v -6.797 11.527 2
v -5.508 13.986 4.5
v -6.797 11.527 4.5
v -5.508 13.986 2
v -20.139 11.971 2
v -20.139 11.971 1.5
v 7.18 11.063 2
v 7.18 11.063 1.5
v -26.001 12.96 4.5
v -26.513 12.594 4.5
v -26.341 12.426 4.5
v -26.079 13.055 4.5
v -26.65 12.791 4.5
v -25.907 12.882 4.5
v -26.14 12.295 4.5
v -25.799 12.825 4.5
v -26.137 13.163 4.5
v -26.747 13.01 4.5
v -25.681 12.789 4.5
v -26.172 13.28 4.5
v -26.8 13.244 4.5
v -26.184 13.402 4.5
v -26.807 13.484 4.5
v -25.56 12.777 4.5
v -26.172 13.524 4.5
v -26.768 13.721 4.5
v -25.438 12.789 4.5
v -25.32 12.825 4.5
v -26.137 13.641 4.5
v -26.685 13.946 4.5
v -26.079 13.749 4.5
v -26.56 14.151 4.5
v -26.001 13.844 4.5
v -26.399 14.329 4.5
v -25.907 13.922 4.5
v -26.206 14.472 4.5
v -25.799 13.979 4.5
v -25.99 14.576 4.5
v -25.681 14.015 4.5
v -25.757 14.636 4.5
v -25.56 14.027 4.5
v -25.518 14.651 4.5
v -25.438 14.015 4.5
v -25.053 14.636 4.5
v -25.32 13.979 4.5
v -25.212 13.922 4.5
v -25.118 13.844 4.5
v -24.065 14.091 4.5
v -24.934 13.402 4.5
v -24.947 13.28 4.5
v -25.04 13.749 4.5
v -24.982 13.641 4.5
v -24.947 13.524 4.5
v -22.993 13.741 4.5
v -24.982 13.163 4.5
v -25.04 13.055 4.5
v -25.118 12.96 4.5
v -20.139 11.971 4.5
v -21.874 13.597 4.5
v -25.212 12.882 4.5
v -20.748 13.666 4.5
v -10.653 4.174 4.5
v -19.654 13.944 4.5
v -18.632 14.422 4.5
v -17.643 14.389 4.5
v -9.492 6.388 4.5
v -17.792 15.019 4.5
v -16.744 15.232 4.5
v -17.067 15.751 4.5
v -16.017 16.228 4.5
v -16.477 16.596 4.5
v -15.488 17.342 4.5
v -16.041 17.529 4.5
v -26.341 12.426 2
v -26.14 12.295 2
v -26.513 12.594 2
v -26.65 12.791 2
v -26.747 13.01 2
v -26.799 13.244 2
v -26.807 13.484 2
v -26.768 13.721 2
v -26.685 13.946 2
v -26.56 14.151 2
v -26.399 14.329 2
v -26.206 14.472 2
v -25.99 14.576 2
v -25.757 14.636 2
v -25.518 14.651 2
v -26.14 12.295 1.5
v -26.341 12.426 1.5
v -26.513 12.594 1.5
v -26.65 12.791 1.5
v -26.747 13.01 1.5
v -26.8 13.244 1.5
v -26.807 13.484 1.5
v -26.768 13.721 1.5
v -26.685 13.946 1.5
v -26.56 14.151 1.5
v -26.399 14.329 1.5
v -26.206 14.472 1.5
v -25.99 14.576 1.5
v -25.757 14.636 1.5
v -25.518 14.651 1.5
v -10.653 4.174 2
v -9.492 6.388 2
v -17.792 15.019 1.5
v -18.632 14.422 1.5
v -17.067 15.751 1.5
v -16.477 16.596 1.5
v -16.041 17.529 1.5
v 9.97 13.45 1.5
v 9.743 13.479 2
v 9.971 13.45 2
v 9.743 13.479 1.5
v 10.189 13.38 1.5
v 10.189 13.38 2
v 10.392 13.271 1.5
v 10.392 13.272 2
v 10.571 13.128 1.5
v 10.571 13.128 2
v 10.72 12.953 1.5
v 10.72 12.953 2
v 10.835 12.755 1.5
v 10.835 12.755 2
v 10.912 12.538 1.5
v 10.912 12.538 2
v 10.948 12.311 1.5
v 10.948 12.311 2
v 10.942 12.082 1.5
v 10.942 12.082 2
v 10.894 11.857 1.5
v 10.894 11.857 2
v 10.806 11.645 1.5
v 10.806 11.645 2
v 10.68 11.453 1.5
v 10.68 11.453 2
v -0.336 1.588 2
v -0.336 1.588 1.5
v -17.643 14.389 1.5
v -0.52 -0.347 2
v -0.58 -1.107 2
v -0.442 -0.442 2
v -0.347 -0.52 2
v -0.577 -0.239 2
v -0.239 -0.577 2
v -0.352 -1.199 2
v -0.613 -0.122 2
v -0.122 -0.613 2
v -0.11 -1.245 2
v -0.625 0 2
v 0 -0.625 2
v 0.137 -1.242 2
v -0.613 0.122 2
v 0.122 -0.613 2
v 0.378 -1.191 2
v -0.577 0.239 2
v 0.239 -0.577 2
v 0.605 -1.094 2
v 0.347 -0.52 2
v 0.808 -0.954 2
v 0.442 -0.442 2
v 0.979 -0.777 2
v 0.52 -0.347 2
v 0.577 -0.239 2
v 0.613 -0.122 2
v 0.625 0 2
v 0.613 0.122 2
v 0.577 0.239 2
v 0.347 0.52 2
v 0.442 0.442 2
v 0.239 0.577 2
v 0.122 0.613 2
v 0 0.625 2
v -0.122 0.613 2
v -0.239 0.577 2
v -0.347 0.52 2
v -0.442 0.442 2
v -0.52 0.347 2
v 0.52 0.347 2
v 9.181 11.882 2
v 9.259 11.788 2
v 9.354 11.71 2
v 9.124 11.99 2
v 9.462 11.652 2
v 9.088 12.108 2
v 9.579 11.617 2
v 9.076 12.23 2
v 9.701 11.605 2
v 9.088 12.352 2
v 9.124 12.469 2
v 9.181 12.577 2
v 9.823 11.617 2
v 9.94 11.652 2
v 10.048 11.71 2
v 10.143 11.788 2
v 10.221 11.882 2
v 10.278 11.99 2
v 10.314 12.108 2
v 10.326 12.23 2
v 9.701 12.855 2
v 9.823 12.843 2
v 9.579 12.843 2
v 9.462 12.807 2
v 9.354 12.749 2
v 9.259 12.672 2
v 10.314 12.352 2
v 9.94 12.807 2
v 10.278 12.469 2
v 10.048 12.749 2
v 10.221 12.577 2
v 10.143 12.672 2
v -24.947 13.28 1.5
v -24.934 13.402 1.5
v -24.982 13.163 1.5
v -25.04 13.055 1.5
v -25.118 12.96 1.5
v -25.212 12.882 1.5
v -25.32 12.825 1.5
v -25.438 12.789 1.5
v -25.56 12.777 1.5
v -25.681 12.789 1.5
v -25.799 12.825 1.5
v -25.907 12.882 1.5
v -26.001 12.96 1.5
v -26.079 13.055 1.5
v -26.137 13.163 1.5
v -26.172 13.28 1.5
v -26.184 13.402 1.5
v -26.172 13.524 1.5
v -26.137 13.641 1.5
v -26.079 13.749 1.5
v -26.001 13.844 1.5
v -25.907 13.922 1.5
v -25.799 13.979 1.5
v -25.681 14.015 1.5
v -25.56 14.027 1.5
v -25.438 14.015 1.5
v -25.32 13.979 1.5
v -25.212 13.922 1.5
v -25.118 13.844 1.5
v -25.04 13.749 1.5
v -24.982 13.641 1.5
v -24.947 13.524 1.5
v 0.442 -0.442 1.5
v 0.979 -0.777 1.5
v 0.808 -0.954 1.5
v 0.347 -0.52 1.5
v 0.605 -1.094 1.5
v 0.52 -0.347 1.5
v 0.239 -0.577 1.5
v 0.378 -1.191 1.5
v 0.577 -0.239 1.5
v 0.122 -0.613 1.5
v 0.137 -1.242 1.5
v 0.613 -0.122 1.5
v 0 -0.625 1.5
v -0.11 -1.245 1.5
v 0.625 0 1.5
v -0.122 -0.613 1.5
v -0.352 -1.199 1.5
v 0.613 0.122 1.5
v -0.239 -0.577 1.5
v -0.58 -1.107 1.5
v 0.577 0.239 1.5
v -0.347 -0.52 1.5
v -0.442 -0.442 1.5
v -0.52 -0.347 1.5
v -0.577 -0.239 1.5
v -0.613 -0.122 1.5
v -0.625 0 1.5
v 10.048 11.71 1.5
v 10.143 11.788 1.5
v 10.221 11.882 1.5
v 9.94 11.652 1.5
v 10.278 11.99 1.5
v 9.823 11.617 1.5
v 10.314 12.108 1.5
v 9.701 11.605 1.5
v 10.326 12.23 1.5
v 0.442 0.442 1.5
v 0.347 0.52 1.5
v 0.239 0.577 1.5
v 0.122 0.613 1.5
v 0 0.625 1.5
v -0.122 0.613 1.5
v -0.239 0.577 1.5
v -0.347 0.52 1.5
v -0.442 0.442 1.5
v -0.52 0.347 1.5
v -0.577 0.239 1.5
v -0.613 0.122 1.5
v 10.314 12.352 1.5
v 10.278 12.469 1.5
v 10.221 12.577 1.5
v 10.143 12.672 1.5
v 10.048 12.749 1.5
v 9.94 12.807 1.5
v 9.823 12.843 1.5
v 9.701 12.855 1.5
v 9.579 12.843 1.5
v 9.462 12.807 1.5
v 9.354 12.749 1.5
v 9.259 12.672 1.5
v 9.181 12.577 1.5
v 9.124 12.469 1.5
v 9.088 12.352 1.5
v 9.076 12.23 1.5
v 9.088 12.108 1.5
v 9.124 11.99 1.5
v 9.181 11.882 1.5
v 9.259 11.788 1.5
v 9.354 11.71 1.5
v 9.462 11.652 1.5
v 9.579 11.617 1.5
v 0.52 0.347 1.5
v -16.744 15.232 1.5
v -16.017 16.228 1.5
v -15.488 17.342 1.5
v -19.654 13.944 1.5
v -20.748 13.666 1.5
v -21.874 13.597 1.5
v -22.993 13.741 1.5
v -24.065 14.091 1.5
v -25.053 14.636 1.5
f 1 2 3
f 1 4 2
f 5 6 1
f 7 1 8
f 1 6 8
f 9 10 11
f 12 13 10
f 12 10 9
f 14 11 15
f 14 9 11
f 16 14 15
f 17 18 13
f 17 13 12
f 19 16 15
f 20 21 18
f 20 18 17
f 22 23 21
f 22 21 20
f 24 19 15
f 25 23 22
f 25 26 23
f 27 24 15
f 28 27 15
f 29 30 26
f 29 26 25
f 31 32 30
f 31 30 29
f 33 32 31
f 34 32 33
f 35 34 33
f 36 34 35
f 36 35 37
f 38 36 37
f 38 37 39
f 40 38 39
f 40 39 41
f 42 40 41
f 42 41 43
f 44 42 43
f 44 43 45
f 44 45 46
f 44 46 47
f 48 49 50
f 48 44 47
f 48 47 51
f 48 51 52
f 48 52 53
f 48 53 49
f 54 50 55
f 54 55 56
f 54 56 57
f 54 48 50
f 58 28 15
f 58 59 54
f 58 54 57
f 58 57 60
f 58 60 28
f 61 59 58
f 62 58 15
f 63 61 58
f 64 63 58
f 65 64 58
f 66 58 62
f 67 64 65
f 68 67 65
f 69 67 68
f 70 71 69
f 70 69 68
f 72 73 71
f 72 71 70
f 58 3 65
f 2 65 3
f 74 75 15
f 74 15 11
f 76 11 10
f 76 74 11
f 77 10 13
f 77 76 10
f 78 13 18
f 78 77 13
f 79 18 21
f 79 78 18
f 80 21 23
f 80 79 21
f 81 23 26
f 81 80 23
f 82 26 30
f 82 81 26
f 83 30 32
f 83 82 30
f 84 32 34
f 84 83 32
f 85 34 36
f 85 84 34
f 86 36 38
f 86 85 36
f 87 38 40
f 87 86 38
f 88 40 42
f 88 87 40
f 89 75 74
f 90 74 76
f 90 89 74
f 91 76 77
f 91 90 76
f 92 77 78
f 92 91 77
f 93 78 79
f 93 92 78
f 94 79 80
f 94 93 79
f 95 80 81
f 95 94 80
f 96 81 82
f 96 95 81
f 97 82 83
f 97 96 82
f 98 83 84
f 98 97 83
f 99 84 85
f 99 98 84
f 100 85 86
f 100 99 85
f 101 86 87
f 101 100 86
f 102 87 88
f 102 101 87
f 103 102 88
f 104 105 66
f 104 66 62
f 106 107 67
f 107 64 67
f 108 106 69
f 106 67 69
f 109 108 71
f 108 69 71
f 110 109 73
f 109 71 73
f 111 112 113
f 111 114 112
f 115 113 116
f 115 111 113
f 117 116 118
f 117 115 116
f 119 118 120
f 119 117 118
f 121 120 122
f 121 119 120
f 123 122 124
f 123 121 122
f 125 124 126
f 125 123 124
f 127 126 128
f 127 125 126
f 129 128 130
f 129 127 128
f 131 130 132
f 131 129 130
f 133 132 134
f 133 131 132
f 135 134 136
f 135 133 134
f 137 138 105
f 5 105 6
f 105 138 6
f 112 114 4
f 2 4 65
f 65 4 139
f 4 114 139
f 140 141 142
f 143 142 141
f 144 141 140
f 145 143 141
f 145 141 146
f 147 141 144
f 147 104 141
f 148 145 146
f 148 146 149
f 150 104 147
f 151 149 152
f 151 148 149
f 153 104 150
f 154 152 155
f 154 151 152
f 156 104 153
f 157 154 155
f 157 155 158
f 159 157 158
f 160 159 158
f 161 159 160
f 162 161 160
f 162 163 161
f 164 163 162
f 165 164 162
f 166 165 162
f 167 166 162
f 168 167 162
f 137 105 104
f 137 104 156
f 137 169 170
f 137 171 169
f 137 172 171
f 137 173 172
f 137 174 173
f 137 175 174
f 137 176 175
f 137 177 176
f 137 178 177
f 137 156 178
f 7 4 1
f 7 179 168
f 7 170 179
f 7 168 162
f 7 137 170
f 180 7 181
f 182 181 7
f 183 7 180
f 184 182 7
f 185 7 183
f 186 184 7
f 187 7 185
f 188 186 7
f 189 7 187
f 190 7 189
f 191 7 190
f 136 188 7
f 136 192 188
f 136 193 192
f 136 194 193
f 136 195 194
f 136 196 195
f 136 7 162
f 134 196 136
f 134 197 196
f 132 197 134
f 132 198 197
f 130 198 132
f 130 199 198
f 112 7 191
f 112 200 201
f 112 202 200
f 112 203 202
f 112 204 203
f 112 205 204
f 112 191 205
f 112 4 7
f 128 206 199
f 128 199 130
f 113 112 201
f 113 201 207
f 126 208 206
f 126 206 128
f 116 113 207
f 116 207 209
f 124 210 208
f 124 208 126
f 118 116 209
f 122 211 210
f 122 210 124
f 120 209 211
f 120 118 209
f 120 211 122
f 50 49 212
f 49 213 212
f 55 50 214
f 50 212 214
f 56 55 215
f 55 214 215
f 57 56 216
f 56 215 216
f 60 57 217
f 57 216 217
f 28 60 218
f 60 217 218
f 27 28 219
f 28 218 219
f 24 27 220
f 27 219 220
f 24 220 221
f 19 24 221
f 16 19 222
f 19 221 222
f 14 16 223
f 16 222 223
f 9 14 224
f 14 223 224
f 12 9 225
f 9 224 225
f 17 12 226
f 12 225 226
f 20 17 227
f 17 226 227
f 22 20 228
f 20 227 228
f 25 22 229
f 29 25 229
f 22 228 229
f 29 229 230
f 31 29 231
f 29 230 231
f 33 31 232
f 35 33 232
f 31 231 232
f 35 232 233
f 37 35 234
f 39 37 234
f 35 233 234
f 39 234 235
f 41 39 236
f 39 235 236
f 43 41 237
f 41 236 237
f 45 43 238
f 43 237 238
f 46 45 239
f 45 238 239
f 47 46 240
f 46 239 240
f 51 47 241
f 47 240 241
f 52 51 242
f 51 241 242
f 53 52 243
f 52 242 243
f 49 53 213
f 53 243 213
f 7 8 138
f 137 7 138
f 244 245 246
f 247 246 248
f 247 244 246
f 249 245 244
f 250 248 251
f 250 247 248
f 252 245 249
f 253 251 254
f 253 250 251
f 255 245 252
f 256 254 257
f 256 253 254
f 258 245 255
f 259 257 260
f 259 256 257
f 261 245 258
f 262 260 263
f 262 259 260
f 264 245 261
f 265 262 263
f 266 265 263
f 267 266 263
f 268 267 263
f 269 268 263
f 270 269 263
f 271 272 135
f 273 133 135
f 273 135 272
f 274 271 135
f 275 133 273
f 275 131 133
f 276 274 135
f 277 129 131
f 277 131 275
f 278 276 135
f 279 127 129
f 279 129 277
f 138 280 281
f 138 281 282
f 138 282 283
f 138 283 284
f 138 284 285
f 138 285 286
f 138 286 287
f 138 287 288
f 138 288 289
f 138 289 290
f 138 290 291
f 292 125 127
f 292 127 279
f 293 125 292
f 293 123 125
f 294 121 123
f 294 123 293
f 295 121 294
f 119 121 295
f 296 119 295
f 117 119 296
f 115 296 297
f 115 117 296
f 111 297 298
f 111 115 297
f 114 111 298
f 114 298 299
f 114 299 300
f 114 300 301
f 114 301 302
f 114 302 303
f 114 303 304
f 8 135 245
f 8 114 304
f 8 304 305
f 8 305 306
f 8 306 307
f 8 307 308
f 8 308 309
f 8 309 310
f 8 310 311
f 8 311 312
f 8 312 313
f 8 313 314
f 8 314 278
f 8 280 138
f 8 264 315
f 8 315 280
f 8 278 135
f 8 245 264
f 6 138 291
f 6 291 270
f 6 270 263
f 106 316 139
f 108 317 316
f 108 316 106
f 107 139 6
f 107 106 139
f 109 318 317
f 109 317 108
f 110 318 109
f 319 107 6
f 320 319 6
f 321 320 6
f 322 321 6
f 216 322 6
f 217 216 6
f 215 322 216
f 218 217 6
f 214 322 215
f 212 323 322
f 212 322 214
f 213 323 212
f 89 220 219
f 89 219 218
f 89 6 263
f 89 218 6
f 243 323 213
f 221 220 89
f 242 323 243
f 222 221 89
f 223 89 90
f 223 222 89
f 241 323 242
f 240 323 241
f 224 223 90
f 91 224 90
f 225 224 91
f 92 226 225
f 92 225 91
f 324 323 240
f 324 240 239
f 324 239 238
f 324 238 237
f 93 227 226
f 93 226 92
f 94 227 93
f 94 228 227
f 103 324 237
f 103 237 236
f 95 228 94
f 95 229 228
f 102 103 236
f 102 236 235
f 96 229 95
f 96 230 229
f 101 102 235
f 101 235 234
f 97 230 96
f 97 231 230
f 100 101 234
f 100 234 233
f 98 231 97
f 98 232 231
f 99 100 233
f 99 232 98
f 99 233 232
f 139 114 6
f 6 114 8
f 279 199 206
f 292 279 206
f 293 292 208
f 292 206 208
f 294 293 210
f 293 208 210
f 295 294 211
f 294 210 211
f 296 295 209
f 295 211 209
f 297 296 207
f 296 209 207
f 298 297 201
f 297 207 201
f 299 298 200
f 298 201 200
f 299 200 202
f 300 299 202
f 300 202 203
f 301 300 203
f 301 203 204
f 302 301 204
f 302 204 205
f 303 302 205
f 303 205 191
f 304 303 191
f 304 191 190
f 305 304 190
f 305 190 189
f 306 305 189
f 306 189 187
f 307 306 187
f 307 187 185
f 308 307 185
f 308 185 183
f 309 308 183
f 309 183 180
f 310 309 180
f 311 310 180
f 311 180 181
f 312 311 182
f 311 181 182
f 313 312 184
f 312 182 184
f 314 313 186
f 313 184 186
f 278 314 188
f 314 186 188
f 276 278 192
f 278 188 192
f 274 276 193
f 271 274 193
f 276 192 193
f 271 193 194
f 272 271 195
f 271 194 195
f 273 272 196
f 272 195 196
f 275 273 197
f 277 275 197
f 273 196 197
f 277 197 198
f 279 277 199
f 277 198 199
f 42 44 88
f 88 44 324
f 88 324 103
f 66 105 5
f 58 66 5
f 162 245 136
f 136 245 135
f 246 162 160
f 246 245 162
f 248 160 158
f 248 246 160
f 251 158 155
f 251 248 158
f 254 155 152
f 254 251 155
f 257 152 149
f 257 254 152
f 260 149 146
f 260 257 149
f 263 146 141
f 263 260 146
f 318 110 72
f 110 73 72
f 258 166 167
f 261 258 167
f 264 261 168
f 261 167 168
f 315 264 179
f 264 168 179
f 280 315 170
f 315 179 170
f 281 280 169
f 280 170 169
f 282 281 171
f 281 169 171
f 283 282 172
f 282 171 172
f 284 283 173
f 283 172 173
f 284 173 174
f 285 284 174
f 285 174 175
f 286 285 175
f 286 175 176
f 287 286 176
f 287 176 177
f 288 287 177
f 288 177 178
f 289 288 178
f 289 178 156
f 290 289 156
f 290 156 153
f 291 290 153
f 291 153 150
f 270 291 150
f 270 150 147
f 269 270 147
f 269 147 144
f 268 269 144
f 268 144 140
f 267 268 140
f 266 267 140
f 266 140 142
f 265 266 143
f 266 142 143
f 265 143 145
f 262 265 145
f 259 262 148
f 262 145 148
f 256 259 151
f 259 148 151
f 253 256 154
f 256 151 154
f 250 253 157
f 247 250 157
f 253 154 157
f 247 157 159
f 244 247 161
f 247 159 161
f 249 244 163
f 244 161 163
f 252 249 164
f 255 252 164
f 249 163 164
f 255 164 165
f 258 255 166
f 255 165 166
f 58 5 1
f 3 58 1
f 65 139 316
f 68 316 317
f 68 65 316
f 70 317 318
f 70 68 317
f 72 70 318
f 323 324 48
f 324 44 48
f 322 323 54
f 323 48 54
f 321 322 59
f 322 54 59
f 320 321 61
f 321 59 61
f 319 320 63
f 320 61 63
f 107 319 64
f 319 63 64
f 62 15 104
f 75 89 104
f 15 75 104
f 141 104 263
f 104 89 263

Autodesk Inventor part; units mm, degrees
ref_plane "YZ Plane" through (0, 0, 0) normal (1, 0, 0) x (0, 1, 0)
ref_plane "XZ Plane" through (0, 0, 0) normal (0, 1, 0) x (-1, 0, 0)
ref_plane "XY Plane" through (0, 0, 0) normal (0, 0, 1) x (1, 0, 0)
sketch "草圖1" plane through (0, 0, 0) normal (0, 0, 1) x (1, 0, 0)
  line L0 (0, 0) -> (-25.5595, 13.402) construction
  line L1 (-25.5595, 13.402) -> (9.701, 12.2296) construction
  line L2 (9.701, 12.2296) -> (0, 0) construction
  line L3 (-25.5595, 13.402) -> (0, 0) construction
  line L4 (-26.1399, 12.2949) -> (-0.5805, -1.107)
  line L5 (0.5805, 1.107) -> (-24.979, 14.509)
  arc A0 (-24.979, 14.509) -> (-26.1399, 12.2949) centre (-25.5595, 13.402) ccw
  arc A1 (-0.5805, -1.107) -> (0.5805, 1.107) centre (0, 0) ccw
  line L6 (-25.5595, 13.402) -> (9.701, 12.2296) construction
  line L7 (-25.601, 12.1527) -> (9.6595, 10.9802)
  line L8 (9.7426, 13.4789) -> (-25.5179, 14.6513)
  arc A2 (-25.5179, 14.6513) -> (-25.601, 12.1527) centre (-25.5595, 13.402) ccw
  arc A3 (9.6595, 10.9802) -> (9.7426, 13.4789) centre (9.701, 12.2296) ccw
  line L9 (9.701, 12.2296) -> (0, 0) construction
  line L10 (8.7217, 13.0064) -> (-0.9793, 0.7768)
  line L11 (0.9793, -0.7768) -> (10.6803, 11.4527)
  arc A4 (10.6803, 11.4527) -> (8.7217, 13.0064) centre (9.701, 12.2296) ccw
  arc A5 (-0.9793, 0.7768) -> (0.9793, -0.7768) centre (0, 0) ccw
  point P0 (-12.7797, 6.701)
  point P1 (-7.9292, 12.8158)
  point P2 (4.8505, 6.1148)
  dimension "d0" = 28.86
  dimension "d1" = 35.28
  dimension "d2" = 15.61
  dimension "d3" = 2.5
  dimension "d4" = 2.5
  dimension "d5" = 2.5
extrude "擠出1" add sketch "草圖1" along normal blind 2 contours A2 L7 L5 L10 A5 L4 | A0 L5 L7 A2 | A5 L10 L5 A1 | L8 A4 L10 L7 L5 A0 | A1 L5 L10 L7 A3 L11 | A3 L7 L10 A4
sketch "草圖2" plane through (0, 0, 2) normal (0, 0, 1) x (1, 0, 0)
  arc A0 (10.6803, 11.4527) -> (9.7426, 13.4789) centre (9.701, 12.2296) ccw projected
  arc A1 (-25.5179, 14.6513) -> (-26.1399, 12.2949) centre (-25.5595, 13.402) ccw projected
  arc A2 (-0.5805, -1.107) -> (0.9793, -0.7768) centre (0, 0) ccw projected
  circle A3 centre (0, 0) radius 0.625
  circle A4 centre (9.701, 12.2296) radius 0.625
  circle A5 centre (-25.5595, 13.402) radius 0.625
  dimension "d8" = 1.25
  dimension "d9" = 1.25
  dimension "d10" = 1.25
extrude "擠出2" cut sketch "草圖2" against normal blind 2
sketch "草圖4" plane through (0, 0, 2) normal (0, 0, 1) x (1, 0, 0)
  circle A0 centre (-25.5595, 13.402) radius 0.625 projected
  line L0 (-0.3361, 1.5877) -> (-20.1387, 11.971) projected
  line L1 (-20.1387, 11.971) -> (7.1799, 11.0627) projected
  line L2 (9.7426, 13.4789) -> (-25.5179, 14.6513) projected
  arc A1 (-25.5179, 14.6513) -> (-26.1399, 12.2949) centre (-25.5595, 13.402) ccw projected
  line L3 (-26.1399, 12.2949) -> (-0.5805, -1.107) projected
  line L4 (-5.5082, 13.986) -> (-6.7973, 11.5274)
  line L5 (-9.4919, 6.3884) -> (-10.6529, 4.1744)
extrude "擠出3" add sketch "草圖4" along normal blind 4
sketch "草圖5" plane through (0, 0, 6) normal (0, 0, 1) x (1, 0, 0)
  circle A0 centre (-21.6744, 19.594) radius 6
  point P0 (0, 0)
  dimension "d17" = 12
extrude "擠出4" cut sketch "草圖5" against normal blind 40
sketch "草圖7" plane through (0, 0, 6) normal (0, 0, 1) x (1, 0, 0)
  arc A0 (-25.0533, 14.6358) -> (-18.6323, 14.4223) centre (-21.6744, 19.594) ccw projected
  line L0 (-25.0533, 14.6358) -> (-25.5179, 14.6513) projected
  arc A1 (-19.7698, 13.9043) -> (-16.0409, 17.5291) centre (-21.6744, 19.594) ccw
  arc A2 (-18.8815, 13.6327) -> (-15.4885, 17.3418) centre (-21.6744, 19.594) ccw
  line L1 (-16.0409, 17.5291) -> (-15.4885, 17.3418)
  line L2 (-19.7698, 13.9043) -> (-18.8815, 13.6327)
  point P0 (0, 0)
extrude "擠出5" add sketch "草圖7" against normal blind 6
sketch "草圖8" plane through (0, 0, 6) normal (0, 0, 1) x (1, 0, 0)
  line L0 (-36.1611, 22.8385) -> (7.9162, 22.8385)
  line L1 (7.9162, 22.8385) -> (7.9162, -4.1508)
  line L2 (7.9162, -4.1508) -> (-36.1611, -4.1508)
  line L3 (-36.1611, -4.1508) -> (-36.1611, 22.8385)
  point P0 (0, 0)
extrude "擠出6" cut sketch "草圖8" against normal blind 1.5
sketch "草圖9" plane through (0, 0, 0) normal (0, 0, -1) x (-1, 0, 0)
  line L0 (-9.7426, 13.4789) -> (17.6433, 14.3894) projected
  arc A0 (-9.7426, 13.4789) -> (-10.6803, 11.4527) centre (-9.701, 12.2296) ccw projected
  line L1 (-0.9793, -0.7768) -> (-10.6803, 11.4527) projected
  arc A1 (-0.9793, -0.7768) -> (0.5805, -1.107) centre (0, 0) ccw projected
  line L2 (26.1399, 12.2949) -> (0.5805, -1.107) projected
  arc A2 (26.1399, 12.2949) -> (25.5179, 14.6513) centre (25.5595, 13.402) ccw projected
  line L3 (25.0533, 14.6358) -> (25.5179, 14.6513) projected
  arc A3 (16.0409, 17.5291) -> (25.0533, 14.6358) centre (21.6744, 19.594) ccw projected
  line L4 (16.0409, 17.5291) -> (15.4885, 17.3418) projected
  arc A4 (15.4885, 17.3418) -> (17.6433, 14.3894) centre (21.6744, 19.594) ccw projected
  line L5 (-7.1799, 11.0627) -> (0.3361, 1.5877) projected
  line L6 (20.1387, 11.971) -> (-7.1799, 11.0627) projected
  line L7 (0.3361, 1.5877) -> (20.1387, 11.971) projected
  circle A5 centre (25.5595, 13.402) radius 0.625 projected
  circle A6 centre (0, 0) radius 0.625 projected
  circle A7 centre (-9.701, 12.2296) radius 0.625 projected
extrude "擠出7" cut sketch "草圖9" against normal blind 1.5
sketch "草圖6" plane through (0, 0, 2) normal (0, 0, 1) x (1, 0, 0)
  arc A0 (-26.0169, 18.4563) -> (-17.0179, 18.323) centre (-21.5174, 18.3896) ccw
  line L0 (-26.0169, 18.4563) -> (-17.0179, 18.323)
  dimension "d20" = 9
sketch "草圖3" plane through (0, 0, 2) normal (0, 0, 1) x (1, 0, 0)
  line L0 (9.7426, 13.4789) -> (-25.5179, 14.6513) projected
  arc A0 (-25.5179, 14.6513) -> (-26.1399, 12.2949) centre (-25.5595, 13.402) ccw projected
  line L1 (-26.1399, 12.2949) -> (-0.5805, -1.107) projected
  line L2 (-25.5595, 17.902) -> (-25.5595, 8.902)
  arc A1 (-22.3114, 10.2875) -> (-21.1974, 14.5076) centre (-25.5595, 13.402) ccw
  arc A2 (-25.5595, 17.902) -> (-25.5595, 8.902) centre (-25.5595, 13.402) ccw
properties part number "1-1"
